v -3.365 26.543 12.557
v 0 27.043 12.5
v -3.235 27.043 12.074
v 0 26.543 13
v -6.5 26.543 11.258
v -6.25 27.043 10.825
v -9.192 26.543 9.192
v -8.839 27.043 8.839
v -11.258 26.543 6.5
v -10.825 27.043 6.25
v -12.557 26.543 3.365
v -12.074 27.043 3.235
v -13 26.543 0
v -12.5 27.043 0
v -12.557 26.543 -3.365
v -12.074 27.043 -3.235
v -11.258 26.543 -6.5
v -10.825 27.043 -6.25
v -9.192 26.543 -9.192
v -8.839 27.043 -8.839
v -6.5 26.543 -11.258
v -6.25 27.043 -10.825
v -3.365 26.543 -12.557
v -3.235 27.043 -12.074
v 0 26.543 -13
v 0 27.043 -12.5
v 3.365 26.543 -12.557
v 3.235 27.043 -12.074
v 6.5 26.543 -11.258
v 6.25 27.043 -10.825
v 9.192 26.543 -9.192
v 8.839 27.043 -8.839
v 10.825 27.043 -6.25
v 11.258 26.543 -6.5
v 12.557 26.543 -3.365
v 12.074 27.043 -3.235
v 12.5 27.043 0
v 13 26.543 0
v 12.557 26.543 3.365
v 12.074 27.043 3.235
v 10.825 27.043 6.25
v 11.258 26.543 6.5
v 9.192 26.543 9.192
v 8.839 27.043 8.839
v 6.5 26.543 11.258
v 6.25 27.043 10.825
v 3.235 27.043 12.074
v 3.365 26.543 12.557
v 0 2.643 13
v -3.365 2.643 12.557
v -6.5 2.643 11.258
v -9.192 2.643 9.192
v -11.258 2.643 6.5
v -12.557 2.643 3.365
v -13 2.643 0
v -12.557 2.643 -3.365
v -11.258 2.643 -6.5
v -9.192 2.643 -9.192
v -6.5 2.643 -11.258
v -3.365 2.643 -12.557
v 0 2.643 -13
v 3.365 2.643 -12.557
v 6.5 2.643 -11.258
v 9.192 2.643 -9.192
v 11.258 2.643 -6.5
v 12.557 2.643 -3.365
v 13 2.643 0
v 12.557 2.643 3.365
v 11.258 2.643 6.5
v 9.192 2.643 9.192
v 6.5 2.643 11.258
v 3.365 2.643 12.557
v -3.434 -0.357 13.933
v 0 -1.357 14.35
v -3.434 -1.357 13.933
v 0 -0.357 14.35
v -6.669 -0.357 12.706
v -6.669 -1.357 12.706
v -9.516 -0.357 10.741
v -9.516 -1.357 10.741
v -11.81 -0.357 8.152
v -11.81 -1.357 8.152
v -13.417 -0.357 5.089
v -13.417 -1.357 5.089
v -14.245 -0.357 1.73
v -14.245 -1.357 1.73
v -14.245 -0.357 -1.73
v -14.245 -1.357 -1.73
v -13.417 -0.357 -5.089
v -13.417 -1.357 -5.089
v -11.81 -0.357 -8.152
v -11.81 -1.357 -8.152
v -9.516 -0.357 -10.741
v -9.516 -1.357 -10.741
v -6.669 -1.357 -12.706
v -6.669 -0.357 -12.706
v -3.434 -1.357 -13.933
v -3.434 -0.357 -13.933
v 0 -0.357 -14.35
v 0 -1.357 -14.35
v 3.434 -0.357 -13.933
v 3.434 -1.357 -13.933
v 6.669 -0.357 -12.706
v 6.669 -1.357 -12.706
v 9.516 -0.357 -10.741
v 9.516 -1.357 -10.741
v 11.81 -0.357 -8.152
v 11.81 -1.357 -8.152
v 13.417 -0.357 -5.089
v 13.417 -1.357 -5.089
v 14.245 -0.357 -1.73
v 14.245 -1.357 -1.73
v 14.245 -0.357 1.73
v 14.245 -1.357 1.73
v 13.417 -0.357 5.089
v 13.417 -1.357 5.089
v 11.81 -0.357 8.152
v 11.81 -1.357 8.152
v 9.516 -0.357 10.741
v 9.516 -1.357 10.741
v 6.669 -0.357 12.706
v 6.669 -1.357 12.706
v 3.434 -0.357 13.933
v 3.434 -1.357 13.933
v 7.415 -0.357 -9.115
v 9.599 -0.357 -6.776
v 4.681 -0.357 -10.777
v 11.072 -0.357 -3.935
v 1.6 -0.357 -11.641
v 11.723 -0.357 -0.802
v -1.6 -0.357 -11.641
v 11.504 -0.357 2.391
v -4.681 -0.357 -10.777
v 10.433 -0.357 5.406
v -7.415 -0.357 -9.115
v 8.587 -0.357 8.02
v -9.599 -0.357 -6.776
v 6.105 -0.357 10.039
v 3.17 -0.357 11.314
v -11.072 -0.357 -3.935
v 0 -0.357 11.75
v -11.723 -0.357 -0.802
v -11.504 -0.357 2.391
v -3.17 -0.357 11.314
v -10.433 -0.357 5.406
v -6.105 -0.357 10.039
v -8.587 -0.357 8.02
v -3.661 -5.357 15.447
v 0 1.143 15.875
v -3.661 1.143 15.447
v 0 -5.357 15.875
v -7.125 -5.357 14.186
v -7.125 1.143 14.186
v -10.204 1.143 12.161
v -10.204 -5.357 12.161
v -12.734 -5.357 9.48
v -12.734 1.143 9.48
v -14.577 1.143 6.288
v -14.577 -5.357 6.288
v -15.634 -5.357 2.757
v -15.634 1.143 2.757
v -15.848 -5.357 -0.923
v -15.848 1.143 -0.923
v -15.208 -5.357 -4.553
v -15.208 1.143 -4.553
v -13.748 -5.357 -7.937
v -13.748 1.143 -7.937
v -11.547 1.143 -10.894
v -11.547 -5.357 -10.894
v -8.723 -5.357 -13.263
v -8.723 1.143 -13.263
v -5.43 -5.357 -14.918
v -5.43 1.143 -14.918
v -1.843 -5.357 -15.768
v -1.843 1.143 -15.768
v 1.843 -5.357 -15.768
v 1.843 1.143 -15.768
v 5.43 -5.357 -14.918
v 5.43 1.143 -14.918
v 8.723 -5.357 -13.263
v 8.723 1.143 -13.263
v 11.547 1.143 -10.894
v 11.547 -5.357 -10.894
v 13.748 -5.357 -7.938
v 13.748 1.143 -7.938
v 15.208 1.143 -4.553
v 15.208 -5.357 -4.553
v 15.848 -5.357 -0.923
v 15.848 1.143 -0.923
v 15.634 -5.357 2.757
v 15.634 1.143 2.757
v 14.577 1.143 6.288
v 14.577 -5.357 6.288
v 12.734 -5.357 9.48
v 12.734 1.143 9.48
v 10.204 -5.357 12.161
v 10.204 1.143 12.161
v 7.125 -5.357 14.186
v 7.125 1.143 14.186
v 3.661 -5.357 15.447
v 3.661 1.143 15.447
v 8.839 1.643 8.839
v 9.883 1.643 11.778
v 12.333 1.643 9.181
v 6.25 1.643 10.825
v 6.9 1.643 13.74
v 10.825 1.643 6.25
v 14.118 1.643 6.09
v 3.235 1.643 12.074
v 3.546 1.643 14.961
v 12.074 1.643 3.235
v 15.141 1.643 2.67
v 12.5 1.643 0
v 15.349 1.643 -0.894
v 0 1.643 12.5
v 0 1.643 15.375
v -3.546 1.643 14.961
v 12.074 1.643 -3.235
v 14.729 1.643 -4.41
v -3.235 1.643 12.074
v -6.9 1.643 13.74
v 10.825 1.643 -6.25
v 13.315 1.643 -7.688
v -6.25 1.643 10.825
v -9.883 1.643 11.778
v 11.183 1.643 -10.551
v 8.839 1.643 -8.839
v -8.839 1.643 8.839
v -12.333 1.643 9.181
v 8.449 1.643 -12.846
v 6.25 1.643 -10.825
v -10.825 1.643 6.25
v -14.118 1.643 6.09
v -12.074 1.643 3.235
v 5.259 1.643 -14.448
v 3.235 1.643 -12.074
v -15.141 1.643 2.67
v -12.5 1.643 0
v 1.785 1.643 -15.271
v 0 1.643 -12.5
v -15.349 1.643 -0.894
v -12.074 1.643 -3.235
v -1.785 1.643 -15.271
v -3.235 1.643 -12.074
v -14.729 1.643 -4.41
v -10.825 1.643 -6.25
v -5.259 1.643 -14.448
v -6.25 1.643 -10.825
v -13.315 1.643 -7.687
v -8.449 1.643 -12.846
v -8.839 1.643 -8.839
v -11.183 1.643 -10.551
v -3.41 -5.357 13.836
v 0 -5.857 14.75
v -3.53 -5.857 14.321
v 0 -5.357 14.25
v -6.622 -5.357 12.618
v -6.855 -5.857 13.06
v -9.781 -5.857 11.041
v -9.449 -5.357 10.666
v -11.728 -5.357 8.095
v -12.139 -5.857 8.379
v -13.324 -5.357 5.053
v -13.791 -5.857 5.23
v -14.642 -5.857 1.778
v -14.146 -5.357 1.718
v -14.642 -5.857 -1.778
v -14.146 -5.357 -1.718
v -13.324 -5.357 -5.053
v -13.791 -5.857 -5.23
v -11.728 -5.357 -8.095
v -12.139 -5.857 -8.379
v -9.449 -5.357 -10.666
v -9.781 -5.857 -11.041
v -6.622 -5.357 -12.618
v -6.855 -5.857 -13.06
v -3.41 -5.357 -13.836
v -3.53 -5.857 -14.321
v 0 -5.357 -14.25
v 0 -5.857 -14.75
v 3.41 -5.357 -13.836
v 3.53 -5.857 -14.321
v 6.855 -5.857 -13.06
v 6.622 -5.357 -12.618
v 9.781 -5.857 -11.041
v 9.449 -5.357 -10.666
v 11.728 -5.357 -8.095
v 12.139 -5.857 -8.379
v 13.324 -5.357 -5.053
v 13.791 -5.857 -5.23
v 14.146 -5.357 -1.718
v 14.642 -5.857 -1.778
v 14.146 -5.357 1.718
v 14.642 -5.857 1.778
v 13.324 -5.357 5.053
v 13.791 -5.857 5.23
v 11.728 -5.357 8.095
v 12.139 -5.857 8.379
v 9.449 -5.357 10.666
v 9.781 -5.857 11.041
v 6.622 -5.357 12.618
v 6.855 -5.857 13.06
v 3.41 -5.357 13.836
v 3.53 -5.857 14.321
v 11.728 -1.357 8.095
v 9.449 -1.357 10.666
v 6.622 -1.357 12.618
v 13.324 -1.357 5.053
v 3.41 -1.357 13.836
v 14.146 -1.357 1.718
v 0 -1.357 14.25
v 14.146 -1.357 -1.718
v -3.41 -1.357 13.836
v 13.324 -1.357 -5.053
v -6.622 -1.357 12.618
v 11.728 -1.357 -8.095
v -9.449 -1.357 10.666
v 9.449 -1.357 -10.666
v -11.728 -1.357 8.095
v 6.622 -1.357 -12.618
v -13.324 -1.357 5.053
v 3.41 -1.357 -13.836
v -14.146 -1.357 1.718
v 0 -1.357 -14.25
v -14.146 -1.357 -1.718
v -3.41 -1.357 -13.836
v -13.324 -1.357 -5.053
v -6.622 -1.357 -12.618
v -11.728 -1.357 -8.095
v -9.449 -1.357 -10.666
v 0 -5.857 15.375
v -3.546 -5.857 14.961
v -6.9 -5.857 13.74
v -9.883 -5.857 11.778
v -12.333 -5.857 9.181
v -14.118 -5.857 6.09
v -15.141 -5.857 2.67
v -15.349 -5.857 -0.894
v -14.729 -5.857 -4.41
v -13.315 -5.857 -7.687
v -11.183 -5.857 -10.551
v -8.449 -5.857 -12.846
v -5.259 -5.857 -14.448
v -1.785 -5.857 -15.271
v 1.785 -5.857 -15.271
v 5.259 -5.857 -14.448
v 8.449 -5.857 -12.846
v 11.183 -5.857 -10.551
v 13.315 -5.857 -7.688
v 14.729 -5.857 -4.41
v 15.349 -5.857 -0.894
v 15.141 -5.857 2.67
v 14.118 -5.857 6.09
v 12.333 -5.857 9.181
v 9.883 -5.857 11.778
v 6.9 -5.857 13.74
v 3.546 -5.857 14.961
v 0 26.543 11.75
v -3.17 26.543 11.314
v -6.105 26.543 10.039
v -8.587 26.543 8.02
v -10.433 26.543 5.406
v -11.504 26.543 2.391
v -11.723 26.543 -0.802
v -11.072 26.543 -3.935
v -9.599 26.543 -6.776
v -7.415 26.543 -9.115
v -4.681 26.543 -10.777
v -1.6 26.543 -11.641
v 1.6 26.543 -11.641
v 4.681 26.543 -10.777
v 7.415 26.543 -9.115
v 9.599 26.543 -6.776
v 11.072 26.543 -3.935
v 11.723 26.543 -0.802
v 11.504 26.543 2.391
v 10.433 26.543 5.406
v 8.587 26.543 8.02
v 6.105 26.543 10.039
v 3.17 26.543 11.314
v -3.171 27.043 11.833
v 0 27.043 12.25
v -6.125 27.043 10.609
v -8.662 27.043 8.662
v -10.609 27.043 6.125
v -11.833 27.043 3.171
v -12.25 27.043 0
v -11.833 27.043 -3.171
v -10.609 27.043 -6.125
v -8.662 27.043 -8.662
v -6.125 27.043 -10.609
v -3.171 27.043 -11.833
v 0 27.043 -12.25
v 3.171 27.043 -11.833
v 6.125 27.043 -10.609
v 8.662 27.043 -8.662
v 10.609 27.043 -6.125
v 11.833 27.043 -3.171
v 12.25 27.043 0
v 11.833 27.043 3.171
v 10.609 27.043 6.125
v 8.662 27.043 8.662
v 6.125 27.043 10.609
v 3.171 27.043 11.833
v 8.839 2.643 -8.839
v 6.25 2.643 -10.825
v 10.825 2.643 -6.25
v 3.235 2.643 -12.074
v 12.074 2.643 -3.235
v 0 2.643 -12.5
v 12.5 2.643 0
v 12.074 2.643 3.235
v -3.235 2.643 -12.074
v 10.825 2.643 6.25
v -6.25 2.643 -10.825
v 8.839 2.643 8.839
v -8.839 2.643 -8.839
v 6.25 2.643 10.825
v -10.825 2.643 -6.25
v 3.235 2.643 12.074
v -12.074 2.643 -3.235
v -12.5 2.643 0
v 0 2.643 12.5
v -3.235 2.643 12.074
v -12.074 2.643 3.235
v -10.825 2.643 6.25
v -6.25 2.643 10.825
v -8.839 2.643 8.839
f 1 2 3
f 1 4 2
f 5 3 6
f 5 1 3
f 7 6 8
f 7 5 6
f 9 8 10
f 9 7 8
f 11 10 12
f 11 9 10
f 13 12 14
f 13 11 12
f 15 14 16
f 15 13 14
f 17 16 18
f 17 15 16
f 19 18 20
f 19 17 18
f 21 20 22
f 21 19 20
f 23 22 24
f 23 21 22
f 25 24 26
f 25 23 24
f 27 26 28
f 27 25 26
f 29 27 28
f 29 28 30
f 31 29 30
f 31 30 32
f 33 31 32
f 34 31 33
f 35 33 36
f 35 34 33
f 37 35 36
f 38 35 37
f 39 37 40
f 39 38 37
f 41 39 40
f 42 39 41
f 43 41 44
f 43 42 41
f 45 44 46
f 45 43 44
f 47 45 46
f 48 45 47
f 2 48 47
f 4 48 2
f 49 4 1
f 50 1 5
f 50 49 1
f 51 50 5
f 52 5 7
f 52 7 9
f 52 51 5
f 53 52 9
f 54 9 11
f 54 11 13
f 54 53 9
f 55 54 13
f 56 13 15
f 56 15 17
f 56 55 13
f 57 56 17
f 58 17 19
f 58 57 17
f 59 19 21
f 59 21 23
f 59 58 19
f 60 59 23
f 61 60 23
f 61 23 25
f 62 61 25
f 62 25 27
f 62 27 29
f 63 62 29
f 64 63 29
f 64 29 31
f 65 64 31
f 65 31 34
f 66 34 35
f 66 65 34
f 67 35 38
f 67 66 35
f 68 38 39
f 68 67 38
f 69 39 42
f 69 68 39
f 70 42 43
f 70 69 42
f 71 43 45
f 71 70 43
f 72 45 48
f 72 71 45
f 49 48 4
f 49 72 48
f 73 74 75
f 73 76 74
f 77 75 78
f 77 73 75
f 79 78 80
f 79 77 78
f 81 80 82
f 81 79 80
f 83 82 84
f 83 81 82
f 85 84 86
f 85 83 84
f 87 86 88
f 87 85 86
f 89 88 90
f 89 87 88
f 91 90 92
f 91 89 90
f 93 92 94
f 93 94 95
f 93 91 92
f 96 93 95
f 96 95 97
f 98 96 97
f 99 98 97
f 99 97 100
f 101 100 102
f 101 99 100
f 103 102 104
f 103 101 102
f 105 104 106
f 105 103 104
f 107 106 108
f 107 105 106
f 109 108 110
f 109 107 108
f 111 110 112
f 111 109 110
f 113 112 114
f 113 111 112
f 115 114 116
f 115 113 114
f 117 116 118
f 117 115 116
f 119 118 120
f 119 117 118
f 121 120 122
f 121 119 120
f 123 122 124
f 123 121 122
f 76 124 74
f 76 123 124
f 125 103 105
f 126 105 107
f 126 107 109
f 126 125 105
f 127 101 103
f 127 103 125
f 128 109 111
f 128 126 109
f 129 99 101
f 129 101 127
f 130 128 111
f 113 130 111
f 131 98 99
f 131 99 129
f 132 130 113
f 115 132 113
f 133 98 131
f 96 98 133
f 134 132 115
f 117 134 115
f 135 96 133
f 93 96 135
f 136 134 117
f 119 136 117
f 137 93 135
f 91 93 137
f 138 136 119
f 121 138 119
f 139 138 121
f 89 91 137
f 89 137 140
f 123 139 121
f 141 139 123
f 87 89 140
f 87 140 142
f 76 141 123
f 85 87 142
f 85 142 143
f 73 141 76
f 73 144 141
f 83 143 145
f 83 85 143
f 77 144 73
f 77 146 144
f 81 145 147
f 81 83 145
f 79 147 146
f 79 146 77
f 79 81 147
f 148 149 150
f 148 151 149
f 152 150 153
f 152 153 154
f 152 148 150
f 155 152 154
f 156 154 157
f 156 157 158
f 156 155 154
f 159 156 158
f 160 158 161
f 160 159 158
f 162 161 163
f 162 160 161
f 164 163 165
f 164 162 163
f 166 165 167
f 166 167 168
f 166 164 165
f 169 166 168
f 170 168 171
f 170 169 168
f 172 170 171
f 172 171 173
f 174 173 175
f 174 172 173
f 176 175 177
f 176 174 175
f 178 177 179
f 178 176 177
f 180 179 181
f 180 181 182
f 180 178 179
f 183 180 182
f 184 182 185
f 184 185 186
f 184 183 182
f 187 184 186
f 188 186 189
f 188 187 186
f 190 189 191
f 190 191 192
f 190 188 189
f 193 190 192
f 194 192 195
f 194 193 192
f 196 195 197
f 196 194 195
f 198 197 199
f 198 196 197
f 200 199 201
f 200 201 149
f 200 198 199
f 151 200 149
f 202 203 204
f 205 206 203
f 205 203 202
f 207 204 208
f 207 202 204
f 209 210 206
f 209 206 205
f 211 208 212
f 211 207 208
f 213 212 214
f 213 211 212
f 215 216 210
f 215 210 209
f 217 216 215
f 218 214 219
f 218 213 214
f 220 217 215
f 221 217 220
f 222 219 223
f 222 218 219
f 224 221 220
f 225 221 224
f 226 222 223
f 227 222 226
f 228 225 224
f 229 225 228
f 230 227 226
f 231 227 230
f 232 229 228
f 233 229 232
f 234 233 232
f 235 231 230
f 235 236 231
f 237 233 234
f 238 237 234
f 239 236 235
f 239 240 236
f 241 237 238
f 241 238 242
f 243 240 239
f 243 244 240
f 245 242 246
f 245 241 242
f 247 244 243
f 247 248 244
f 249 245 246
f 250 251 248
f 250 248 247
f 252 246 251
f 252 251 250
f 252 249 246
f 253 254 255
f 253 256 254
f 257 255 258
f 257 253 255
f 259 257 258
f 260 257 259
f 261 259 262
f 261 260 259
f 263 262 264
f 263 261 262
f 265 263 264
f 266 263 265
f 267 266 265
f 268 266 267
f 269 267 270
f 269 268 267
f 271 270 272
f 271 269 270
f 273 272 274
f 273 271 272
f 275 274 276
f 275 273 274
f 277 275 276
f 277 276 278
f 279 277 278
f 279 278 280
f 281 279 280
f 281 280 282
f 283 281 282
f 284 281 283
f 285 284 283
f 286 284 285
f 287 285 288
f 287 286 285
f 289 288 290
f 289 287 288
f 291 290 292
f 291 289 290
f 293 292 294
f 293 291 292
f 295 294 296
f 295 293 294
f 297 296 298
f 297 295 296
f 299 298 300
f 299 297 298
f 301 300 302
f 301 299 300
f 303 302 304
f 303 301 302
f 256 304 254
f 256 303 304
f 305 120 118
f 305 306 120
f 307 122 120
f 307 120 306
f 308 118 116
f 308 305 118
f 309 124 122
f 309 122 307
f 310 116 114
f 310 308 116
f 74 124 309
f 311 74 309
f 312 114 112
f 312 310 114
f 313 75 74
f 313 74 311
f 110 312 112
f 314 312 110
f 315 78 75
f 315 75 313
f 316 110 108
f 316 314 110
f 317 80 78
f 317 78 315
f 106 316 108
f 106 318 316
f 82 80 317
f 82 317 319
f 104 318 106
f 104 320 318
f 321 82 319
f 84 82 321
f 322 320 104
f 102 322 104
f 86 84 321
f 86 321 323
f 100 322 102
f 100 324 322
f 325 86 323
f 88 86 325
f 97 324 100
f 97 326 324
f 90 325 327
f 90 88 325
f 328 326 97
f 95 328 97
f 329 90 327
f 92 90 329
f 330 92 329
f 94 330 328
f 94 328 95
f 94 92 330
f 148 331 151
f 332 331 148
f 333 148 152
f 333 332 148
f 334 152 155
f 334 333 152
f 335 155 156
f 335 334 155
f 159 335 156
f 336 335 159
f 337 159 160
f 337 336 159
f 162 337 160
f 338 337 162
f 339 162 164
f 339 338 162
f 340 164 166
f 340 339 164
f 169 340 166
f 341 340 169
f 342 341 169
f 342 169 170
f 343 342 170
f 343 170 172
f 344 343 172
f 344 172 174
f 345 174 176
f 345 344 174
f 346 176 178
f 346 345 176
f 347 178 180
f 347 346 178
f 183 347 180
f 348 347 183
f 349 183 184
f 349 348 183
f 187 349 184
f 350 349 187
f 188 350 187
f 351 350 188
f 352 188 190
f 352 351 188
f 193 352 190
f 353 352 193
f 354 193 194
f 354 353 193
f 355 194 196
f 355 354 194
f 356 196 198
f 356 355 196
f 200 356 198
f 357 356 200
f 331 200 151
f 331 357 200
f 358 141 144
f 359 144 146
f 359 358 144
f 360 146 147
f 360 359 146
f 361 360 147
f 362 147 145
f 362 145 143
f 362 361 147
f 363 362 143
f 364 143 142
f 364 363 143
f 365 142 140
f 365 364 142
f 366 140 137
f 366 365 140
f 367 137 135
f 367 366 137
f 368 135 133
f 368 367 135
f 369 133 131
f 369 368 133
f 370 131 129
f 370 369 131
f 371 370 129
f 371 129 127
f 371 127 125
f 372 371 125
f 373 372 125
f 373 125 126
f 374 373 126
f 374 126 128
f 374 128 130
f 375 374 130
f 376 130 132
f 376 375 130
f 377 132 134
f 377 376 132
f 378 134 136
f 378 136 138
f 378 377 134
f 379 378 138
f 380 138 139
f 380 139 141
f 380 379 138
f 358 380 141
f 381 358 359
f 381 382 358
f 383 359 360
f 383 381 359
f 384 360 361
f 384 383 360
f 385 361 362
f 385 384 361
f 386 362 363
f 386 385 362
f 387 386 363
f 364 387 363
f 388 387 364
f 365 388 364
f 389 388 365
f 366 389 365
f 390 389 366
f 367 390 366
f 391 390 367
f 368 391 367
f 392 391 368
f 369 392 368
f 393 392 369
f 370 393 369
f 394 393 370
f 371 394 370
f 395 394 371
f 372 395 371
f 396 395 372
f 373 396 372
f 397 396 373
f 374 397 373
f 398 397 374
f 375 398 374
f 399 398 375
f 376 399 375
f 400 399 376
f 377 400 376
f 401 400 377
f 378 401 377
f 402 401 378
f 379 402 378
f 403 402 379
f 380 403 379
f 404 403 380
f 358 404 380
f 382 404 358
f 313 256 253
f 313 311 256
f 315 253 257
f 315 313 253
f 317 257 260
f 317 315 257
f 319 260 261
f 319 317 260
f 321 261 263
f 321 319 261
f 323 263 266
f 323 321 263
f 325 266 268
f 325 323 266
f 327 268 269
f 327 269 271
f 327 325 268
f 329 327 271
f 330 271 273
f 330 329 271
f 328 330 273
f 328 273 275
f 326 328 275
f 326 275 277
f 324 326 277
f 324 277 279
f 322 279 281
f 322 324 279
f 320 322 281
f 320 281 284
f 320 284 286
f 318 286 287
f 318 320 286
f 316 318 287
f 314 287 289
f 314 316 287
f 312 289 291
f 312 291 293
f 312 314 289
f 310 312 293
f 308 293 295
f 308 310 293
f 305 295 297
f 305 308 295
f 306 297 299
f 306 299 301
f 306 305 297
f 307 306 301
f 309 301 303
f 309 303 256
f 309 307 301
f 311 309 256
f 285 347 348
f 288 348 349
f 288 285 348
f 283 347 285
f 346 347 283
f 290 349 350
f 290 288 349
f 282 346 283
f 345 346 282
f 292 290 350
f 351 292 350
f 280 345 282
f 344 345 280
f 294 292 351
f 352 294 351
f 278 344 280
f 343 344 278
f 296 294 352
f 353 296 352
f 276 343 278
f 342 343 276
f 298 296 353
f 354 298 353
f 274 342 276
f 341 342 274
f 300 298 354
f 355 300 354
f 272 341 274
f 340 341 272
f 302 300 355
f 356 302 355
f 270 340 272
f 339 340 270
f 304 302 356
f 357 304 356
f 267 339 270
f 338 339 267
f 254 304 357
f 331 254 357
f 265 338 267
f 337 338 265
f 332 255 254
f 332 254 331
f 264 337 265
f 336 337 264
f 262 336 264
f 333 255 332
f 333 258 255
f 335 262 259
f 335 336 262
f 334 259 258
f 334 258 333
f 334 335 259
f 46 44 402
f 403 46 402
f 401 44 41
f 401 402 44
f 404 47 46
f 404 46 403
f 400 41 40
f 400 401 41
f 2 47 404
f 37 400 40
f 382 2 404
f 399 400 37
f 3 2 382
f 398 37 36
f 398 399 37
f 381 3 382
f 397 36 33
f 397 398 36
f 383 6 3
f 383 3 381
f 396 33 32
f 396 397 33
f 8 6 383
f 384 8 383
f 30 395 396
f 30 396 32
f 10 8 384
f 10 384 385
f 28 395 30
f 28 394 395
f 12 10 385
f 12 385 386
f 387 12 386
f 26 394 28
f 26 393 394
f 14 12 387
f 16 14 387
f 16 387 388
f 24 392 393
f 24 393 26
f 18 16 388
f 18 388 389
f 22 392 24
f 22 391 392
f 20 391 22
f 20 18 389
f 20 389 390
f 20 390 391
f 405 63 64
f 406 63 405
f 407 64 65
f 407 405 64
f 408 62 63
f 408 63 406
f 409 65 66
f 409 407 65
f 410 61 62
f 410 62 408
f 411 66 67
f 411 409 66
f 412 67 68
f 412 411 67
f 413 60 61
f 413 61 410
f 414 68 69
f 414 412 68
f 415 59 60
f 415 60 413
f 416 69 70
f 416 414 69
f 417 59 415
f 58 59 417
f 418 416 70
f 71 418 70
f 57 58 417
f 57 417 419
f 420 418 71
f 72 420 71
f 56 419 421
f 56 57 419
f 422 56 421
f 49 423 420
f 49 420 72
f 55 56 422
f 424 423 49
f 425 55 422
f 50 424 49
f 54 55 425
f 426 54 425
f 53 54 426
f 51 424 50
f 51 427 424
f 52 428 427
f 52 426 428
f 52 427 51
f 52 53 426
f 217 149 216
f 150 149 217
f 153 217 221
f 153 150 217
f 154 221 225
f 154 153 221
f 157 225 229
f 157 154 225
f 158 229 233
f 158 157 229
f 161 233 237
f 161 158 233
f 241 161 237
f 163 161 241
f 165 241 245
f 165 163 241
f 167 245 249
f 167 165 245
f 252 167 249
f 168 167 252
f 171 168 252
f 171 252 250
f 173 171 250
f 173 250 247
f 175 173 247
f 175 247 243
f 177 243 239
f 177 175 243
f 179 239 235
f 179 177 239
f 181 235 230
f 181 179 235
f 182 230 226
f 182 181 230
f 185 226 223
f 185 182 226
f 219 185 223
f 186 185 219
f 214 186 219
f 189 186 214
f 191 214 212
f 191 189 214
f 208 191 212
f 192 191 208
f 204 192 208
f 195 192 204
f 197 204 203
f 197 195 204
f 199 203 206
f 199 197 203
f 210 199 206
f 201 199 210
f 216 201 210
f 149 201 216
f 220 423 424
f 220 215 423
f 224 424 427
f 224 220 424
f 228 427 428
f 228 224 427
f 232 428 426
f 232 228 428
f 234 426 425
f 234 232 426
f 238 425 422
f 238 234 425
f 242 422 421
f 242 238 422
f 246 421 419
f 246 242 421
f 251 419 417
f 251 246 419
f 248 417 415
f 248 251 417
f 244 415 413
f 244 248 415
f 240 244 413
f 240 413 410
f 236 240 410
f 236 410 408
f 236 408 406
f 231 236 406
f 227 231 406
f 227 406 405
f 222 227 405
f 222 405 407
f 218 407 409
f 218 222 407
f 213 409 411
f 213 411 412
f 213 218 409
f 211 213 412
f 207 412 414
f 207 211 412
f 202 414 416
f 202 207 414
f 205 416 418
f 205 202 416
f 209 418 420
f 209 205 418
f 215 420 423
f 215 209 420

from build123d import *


with BuildPart() as part:
    # 草图1 → 旋转2 (revolve)
    with BuildSketch(Plane.XY, mode=Mode.PRIVATE) as revolve_2_sk:
        Polygon((12.25, 27.042854175), (12.5, 27.042854175), (13, 26.542854175), (13, 2.642854175), (12.5, 2.642854175), (12.5, 1.642854175), (15.375, 1.642854175), (15.875, 1.142854175), (15.875, -5.357145825), (15.375, -5.857145825), (14.75, -5.857145825), (14.25, -5.357145825), (14.25, -1.357145825), (14.35, -1.357145825), (14.35, -0.357145825), (11.75, -0.357145825), (11.75, 26.542854175), align=None)
    revolve(revolve_2_sk.sketch.rotate(Axis((0, 44.598597745, 0), (0, -1, 0)), 90), axis=Axis((0, 44.598597745, 0), (0, -1, 0)))  # turned: the seam where the file's is


solid = part.part
